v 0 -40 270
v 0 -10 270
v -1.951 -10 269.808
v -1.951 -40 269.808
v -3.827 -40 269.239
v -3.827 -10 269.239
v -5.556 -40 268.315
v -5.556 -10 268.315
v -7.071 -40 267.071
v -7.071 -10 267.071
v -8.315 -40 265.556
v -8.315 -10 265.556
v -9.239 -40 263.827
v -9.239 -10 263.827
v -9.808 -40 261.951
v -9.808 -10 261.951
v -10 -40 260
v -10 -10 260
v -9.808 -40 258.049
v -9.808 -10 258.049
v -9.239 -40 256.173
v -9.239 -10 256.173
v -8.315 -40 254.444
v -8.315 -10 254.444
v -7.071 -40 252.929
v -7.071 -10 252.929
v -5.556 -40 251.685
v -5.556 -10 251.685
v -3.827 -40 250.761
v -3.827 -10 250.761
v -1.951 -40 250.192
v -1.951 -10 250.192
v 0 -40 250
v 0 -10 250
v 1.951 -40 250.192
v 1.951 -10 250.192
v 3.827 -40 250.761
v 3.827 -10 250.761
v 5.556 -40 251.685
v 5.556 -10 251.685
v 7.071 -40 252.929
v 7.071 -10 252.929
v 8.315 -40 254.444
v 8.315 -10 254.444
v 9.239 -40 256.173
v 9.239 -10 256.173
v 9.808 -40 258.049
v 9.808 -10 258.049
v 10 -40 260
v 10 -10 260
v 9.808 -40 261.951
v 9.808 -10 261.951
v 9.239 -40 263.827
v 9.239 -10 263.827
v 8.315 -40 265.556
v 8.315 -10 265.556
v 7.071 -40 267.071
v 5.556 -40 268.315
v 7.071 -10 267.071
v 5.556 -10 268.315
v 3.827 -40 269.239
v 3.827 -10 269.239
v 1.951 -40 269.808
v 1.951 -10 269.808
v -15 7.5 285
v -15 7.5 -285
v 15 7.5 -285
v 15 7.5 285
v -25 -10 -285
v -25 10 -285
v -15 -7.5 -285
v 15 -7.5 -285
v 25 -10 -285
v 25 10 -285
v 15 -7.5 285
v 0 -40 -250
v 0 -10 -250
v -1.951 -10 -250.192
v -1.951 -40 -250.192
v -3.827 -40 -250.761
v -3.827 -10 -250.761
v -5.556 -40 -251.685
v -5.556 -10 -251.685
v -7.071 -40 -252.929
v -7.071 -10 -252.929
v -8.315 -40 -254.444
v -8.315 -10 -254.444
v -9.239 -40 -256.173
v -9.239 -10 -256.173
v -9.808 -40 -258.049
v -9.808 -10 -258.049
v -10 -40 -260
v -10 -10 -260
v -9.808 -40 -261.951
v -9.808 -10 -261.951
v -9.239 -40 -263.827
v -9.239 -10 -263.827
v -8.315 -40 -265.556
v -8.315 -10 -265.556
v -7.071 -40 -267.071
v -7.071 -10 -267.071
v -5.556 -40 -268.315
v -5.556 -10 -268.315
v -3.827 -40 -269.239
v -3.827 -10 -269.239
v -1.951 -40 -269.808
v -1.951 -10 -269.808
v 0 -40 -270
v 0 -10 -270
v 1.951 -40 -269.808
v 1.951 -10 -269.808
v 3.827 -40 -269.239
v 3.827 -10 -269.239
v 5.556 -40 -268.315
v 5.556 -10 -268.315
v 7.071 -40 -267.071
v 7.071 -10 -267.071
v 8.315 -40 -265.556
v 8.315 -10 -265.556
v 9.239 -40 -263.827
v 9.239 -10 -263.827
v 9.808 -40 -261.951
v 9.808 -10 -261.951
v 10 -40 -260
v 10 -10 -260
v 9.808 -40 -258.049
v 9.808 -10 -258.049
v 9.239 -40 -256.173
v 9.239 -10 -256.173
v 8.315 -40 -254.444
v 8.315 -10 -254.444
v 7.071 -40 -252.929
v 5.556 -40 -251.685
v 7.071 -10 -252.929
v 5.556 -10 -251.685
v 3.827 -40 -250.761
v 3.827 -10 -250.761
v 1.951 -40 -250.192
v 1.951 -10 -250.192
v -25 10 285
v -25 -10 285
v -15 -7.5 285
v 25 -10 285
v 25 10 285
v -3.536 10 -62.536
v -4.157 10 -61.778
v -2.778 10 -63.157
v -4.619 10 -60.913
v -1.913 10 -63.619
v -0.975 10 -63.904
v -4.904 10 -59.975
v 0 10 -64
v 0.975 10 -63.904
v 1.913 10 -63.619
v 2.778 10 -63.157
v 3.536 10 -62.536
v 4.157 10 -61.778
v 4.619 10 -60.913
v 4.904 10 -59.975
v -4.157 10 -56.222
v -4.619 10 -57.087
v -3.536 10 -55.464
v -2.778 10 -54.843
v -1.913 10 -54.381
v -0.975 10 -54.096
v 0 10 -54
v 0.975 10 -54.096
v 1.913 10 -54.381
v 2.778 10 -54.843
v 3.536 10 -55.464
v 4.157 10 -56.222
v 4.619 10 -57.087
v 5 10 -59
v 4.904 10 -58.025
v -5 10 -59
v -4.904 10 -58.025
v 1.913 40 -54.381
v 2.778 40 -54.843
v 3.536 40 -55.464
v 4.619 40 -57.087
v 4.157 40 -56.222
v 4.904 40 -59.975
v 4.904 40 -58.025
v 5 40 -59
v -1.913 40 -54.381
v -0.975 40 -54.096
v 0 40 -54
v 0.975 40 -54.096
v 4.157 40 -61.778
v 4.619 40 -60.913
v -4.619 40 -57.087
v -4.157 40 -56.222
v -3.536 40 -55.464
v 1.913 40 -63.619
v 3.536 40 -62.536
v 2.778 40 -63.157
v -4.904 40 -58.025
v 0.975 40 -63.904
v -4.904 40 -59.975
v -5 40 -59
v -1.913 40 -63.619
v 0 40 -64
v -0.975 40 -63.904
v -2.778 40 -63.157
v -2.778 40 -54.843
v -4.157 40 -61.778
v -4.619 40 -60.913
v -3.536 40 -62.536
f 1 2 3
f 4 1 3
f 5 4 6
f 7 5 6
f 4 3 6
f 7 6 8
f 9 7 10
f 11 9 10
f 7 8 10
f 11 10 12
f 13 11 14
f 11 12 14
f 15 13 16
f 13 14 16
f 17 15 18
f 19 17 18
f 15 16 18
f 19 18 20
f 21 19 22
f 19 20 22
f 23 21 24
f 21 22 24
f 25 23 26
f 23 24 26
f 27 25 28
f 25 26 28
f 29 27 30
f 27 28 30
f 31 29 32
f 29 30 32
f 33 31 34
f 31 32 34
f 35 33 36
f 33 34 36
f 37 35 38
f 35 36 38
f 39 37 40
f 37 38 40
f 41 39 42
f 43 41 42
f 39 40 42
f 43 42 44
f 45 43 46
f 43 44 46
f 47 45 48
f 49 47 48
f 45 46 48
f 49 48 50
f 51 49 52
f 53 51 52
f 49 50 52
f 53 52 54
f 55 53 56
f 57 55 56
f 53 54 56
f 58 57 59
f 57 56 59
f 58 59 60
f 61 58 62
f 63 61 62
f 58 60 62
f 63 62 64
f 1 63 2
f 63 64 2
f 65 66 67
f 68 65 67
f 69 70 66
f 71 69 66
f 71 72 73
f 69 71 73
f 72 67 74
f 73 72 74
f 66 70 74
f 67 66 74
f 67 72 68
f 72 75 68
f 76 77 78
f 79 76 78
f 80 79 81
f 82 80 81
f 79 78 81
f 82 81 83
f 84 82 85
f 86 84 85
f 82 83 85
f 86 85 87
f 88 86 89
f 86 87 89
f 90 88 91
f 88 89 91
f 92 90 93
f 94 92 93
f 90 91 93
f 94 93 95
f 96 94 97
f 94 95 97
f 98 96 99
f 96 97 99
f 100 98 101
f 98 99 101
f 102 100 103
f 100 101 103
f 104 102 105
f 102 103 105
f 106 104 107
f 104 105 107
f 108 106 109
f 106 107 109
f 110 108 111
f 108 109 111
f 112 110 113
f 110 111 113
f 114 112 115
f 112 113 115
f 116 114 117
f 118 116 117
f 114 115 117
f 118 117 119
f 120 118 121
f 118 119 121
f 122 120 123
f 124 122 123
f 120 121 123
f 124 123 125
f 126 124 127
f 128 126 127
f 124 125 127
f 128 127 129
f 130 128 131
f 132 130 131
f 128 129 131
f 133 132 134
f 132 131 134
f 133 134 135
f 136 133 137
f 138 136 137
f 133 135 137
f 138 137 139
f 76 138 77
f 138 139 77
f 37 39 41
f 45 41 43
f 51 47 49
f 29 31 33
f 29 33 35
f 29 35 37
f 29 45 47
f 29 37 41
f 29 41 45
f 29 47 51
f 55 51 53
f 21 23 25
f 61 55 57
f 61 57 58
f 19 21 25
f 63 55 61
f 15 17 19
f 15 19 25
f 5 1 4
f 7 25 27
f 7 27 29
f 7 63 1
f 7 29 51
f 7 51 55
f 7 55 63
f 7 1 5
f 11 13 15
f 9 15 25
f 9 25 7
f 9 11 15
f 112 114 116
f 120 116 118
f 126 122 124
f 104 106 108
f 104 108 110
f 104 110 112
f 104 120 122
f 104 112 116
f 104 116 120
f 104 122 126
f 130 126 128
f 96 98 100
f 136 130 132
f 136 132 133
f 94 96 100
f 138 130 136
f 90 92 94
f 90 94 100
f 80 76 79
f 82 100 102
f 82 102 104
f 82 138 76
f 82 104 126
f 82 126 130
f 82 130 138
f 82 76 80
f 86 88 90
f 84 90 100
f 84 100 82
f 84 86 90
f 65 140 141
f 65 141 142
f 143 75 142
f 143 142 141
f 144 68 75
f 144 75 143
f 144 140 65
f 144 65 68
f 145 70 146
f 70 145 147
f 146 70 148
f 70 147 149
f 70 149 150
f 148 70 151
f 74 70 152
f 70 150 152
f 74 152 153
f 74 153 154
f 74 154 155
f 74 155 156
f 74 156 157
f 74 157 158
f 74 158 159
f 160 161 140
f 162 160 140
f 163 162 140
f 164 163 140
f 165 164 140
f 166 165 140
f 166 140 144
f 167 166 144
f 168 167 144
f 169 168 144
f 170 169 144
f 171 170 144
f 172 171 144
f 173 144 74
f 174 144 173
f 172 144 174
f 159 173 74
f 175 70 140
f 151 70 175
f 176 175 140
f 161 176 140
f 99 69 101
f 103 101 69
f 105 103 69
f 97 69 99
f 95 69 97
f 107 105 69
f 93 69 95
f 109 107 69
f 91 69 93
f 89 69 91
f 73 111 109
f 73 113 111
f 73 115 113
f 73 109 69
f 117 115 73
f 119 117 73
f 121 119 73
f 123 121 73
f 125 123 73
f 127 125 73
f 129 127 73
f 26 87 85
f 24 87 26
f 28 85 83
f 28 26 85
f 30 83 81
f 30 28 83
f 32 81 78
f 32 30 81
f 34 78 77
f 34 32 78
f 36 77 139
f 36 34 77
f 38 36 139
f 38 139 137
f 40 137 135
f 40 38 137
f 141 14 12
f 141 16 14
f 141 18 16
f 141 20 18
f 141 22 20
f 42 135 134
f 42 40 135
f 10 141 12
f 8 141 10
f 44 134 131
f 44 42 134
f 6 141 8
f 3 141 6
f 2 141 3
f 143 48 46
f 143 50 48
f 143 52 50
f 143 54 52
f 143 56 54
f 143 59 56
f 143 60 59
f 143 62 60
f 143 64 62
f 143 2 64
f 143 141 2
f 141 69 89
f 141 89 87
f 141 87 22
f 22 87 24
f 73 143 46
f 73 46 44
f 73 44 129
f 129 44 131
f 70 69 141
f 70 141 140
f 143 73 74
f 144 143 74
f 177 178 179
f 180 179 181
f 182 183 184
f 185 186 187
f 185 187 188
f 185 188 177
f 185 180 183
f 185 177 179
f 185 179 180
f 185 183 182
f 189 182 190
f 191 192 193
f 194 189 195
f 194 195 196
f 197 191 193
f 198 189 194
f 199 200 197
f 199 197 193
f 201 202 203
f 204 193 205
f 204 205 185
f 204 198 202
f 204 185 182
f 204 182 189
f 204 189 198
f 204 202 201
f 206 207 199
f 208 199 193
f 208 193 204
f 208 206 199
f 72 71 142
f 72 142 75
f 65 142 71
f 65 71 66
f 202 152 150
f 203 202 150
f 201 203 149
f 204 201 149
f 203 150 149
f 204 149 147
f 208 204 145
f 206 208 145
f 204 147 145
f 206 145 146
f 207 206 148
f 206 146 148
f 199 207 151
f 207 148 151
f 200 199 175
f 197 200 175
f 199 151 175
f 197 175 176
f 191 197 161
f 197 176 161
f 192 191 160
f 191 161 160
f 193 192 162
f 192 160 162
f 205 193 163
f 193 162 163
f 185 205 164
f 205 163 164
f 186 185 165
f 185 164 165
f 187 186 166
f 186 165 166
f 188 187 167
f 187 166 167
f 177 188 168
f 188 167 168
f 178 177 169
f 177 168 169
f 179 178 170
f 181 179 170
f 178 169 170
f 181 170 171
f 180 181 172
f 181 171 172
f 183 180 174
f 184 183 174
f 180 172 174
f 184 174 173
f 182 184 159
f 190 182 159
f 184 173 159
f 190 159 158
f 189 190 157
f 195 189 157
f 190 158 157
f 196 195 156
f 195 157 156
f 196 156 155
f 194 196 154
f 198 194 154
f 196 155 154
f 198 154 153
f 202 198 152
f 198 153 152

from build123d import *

# Parameters (mm, degrees)
SKETCH_1_W      = 50
SKETCH_1_H      = 20
SKETCH_1_W_2    = 30
SKETCH_1_H_2    = 15
EXTRUDE_1_DEPTH = 285
SKETCH_2_R      = 10
EXTRUDE_2_DEPTH = 30
SKETCH_3_R      = 5
EXTRUDE_3_DEPTH = 30


with BuildPart() as part:
    # Эскиз1 → Бобышка-Вытянуть1 (new, symmetric)
    with BuildSketch(Plane.XY):
        Rectangle(SKETCH_1_W, SKETCH_1_H)
        Rectangle(SKETCH_1_W_2, SKETCH_1_H_2, mode=Mode.SUBTRACT)
    extrude(amount=EXTRUDE_1_DEPTH, both=True)

    # Эскиз2 → Бобышка-Вытянуть2 (add)
    with BuildSketch(Plane.XZ.offset(10)):
        with Locations(Location((0, 260, 0), (0, 0, 90))):
            Circle(SKETCH_2_R)
        with Locations(Location((0, -260, 0), (0, 0, 90))):
            Circle(SKETCH_2_R)
    extrude(amount=EXTRUDE_2_DEPTH)

    # Эскиз3 → Бобышка-Вытянуть3 (add)
    with BuildSketch(Plane(origin=(0, 10, 0), x_dir=(1, 0, 0), z_dir=(0, 1, 0))):
        with Locations(Location((0, 59, 0), (0, 0, 90))):
            Circle(SKETCH_3_R)
    extrude(amount=EXTRUDE_3_DEPTH)


solid = part.part
